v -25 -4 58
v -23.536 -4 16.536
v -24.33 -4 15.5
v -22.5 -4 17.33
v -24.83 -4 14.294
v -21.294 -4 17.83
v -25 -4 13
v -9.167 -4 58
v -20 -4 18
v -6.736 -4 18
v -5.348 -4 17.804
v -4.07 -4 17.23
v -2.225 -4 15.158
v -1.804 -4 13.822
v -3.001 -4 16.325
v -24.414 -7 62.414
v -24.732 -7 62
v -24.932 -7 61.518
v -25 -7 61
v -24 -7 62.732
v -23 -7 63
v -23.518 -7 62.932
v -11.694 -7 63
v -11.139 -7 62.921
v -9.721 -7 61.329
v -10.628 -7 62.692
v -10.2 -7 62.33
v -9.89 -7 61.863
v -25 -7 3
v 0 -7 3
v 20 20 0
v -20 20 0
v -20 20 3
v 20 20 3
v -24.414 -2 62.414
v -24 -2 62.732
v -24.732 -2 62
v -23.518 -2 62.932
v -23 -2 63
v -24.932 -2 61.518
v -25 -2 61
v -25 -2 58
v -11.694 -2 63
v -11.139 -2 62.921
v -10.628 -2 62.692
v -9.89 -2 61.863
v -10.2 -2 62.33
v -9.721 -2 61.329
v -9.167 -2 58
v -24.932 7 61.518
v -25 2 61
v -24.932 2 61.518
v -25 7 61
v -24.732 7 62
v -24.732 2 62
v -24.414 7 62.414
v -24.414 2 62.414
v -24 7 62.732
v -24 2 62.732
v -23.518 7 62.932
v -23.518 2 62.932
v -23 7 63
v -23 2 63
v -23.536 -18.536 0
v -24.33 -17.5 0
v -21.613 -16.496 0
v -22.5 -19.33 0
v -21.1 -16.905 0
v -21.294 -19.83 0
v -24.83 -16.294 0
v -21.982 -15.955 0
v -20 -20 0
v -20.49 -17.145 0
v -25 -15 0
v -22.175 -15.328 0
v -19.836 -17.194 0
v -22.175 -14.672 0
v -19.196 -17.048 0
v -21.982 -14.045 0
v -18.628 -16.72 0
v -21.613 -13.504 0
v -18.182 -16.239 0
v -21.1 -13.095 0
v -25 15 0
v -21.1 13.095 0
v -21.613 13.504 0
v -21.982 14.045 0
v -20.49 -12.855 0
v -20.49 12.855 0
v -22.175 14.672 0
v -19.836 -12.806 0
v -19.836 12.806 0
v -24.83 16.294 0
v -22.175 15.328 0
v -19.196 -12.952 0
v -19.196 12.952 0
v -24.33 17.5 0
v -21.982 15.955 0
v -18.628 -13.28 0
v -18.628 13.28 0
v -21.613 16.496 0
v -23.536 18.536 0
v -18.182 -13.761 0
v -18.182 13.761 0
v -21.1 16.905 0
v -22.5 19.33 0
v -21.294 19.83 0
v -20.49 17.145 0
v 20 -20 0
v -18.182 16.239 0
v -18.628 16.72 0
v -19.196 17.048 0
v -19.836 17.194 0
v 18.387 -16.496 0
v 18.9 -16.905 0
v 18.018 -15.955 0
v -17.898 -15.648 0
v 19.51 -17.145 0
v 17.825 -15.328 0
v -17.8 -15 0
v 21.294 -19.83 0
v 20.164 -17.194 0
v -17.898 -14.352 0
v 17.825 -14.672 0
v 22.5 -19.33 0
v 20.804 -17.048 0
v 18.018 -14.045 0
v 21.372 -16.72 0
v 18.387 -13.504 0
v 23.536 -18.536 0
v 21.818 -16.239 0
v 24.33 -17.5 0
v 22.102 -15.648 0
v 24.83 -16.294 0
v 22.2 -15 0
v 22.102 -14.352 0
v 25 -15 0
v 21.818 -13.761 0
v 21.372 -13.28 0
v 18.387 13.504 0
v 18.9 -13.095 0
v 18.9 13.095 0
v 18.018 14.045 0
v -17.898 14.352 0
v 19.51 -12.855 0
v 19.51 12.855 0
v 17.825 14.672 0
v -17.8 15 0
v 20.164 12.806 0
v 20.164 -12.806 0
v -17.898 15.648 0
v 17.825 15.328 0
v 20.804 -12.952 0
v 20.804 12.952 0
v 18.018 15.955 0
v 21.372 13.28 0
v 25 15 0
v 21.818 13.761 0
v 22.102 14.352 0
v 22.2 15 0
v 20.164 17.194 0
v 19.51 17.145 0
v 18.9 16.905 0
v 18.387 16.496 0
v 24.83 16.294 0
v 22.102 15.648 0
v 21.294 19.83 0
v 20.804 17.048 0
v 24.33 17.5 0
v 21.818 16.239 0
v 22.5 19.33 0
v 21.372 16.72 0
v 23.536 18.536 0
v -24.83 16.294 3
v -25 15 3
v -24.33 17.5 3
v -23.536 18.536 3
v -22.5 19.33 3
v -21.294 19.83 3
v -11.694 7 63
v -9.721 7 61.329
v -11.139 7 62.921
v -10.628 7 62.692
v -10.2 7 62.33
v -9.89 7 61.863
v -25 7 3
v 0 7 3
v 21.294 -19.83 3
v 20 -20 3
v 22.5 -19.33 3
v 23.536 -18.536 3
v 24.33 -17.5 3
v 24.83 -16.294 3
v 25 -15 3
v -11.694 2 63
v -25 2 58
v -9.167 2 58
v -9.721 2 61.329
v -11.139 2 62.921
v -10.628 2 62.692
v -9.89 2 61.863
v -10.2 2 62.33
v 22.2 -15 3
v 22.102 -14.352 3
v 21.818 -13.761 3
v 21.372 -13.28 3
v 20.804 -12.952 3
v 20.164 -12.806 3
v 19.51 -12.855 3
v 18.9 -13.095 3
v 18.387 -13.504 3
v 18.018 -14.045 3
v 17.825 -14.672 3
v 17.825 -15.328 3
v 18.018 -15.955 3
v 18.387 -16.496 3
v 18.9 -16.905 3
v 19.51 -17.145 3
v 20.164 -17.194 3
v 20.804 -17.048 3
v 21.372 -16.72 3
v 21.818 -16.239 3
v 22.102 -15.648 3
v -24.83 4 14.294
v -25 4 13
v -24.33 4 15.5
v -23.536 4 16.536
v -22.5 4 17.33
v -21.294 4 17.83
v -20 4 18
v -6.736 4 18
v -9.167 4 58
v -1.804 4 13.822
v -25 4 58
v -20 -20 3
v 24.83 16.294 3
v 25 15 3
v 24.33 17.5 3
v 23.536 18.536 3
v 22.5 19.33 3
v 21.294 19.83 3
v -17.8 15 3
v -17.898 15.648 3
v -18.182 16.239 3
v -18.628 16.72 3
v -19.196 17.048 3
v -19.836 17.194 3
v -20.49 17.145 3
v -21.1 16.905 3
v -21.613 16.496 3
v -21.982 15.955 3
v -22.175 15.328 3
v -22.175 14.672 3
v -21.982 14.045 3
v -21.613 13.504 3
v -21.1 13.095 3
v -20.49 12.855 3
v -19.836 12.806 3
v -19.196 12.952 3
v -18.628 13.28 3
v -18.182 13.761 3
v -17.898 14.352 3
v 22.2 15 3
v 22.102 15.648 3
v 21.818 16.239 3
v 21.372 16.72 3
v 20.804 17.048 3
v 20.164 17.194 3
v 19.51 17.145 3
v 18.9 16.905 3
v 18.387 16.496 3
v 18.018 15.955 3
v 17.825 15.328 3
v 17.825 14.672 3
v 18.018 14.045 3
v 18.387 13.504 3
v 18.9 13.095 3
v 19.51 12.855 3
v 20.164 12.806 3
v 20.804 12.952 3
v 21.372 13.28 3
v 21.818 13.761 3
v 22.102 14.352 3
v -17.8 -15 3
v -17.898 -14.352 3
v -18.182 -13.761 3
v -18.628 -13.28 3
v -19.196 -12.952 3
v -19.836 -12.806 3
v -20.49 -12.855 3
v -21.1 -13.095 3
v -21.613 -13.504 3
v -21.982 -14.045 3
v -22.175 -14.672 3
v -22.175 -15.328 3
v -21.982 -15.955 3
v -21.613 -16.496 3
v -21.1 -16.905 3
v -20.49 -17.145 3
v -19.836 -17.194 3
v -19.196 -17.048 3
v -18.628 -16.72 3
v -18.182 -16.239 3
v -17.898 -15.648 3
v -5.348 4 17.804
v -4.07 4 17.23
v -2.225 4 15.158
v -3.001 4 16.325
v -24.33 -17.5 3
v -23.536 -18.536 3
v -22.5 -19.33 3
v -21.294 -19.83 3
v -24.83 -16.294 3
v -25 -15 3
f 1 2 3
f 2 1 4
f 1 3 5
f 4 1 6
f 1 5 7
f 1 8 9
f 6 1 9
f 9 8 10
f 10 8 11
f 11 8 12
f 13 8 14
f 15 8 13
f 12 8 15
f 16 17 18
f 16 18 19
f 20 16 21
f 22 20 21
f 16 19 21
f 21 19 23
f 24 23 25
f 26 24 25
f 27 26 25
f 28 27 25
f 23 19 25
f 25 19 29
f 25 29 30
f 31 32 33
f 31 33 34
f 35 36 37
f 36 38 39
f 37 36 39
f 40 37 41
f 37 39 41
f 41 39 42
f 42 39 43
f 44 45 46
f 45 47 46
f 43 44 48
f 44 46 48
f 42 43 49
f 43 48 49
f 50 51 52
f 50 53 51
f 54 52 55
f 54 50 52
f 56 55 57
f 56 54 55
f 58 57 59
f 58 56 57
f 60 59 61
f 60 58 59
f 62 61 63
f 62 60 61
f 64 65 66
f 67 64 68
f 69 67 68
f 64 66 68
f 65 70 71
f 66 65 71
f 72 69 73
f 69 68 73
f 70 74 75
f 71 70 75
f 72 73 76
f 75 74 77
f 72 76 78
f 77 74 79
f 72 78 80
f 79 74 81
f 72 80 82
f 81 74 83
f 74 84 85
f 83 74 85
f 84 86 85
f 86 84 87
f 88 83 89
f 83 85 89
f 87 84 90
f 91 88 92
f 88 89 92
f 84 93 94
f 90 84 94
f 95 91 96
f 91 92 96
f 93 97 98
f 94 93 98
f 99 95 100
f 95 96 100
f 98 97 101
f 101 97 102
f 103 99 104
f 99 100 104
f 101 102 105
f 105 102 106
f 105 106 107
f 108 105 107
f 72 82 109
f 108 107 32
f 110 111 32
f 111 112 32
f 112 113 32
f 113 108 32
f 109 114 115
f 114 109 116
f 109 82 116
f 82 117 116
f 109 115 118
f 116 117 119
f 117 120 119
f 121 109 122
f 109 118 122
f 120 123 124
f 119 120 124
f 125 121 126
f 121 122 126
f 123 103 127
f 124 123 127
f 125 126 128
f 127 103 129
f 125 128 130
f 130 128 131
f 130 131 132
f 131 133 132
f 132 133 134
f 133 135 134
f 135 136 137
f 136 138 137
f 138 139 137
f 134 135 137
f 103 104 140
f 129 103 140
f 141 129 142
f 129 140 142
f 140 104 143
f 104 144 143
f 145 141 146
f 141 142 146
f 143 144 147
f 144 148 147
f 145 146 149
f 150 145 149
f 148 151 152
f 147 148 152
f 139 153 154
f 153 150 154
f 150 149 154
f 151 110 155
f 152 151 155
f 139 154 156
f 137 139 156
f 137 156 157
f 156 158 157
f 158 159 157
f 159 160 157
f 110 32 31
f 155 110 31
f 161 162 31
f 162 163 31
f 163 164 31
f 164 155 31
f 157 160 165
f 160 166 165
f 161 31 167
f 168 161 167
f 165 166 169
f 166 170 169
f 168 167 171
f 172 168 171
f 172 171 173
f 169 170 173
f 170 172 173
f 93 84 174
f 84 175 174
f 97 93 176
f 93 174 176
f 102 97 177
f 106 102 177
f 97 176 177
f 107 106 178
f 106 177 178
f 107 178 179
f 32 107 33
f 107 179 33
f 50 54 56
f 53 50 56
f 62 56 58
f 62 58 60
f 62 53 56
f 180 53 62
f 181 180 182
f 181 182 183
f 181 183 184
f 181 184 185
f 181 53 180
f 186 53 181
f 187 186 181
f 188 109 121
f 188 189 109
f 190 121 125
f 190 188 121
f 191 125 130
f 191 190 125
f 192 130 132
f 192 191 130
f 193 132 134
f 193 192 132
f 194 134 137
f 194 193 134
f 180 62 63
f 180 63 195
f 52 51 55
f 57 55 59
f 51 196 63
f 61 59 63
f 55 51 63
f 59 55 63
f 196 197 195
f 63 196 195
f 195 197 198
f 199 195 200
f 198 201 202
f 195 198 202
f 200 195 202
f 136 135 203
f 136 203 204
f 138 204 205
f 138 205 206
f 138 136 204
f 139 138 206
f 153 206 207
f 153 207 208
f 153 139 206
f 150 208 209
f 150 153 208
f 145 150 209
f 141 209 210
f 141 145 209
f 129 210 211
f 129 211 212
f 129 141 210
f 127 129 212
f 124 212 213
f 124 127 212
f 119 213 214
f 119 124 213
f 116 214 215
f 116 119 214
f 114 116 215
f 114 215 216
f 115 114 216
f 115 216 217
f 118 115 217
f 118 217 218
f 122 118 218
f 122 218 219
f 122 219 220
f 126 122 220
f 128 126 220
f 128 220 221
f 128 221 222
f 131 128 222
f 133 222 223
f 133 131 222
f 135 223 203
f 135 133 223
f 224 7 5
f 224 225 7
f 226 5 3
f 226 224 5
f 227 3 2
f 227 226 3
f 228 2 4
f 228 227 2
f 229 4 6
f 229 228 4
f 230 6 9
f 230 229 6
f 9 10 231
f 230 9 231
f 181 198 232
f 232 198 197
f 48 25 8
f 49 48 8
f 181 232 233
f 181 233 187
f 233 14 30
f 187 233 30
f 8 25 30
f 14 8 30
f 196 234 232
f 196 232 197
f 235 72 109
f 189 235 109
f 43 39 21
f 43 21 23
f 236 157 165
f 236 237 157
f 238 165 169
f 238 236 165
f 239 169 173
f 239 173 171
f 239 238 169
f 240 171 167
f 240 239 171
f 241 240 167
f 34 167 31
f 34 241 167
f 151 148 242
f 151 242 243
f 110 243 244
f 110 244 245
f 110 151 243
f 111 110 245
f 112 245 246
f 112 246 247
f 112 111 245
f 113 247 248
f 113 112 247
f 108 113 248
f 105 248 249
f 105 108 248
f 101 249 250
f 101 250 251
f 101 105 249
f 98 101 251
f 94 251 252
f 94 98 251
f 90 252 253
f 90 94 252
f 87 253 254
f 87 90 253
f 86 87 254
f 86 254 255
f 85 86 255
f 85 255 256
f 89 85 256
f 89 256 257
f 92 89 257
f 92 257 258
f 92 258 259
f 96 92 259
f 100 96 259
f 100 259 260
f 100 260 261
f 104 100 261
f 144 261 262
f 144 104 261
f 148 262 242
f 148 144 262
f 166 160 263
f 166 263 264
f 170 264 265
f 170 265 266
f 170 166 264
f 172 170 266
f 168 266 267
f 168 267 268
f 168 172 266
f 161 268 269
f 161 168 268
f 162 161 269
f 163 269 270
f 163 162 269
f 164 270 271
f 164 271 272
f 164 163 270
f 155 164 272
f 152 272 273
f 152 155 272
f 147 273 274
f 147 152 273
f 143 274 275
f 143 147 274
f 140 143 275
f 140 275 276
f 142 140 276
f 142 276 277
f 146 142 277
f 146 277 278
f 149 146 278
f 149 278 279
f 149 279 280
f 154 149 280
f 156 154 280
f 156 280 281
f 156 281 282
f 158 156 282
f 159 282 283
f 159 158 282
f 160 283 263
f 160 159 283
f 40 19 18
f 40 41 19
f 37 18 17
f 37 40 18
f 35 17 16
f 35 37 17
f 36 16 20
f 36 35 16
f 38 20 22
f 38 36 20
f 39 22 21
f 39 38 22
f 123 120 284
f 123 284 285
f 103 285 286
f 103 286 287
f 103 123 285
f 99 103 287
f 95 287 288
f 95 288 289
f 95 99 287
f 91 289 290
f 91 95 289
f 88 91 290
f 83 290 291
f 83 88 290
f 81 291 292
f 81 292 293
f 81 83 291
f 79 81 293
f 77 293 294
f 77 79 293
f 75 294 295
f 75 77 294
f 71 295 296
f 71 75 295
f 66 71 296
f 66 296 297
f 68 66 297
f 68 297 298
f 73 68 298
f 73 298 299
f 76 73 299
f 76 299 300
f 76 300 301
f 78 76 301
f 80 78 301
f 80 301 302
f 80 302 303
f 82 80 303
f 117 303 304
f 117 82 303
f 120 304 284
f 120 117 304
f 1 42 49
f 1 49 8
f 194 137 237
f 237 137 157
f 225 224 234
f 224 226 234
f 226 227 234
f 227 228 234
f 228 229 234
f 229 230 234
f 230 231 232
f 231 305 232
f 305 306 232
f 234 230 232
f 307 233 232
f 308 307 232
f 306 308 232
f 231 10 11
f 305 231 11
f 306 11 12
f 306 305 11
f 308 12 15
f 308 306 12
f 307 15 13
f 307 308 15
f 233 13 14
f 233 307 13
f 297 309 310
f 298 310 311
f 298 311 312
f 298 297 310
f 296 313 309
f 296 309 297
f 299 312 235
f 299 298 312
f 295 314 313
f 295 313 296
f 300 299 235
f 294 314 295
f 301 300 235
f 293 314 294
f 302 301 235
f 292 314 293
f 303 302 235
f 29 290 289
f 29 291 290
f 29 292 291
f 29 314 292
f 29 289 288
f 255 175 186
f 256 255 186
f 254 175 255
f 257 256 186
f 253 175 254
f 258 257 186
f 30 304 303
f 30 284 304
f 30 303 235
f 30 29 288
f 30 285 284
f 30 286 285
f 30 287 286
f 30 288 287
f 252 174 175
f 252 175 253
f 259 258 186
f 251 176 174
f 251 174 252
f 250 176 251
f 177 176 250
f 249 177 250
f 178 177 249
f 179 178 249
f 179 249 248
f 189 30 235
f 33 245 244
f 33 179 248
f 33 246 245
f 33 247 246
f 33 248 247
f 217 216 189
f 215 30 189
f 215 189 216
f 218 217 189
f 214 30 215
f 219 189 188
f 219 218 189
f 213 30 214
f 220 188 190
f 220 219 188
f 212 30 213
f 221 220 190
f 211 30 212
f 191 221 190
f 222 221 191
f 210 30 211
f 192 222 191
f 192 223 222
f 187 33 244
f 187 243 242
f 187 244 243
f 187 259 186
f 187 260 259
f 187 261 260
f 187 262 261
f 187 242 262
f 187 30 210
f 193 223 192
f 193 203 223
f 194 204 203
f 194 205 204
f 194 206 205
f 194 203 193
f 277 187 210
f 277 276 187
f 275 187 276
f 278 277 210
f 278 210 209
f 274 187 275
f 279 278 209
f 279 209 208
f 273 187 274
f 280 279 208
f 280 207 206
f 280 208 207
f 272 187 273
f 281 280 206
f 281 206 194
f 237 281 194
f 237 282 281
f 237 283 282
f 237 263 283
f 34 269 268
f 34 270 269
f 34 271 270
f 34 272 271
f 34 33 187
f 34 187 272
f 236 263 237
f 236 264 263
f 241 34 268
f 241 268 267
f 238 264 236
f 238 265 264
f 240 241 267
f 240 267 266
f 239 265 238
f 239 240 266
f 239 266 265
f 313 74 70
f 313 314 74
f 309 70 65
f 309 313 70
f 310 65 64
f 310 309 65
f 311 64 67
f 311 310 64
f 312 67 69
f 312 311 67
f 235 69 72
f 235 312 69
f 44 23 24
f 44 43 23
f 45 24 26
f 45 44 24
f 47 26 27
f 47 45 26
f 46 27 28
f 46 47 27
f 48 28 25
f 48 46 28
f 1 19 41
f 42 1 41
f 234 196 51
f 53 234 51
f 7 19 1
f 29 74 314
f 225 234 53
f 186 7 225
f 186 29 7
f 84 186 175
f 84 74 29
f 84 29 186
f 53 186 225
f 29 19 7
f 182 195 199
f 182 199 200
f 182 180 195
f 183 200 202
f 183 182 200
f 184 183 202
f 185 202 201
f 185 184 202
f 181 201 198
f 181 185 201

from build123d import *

# Parameters (mm, degrees)
SKETCH_W        = 50
SKETCH_H        = 40
SKETCH_R        = 2.2
PAD_DEPTH       = 3
SKETCH001_W     = 50
SKETCH001_H     = 14
PAD001_DEPTH    = 60
POCKET_DEPTH    = 50
POCKET001_DEPTH = 14
FILLET_R        = 5
FILLET001_R     = 2
FILLET002_R     = 5


with BuildPart() as part:
    # Sketch → Pad (new body)
    with BuildSketch(Plane.XY):
        Rectangle(SKETCH_W, SKETCH_H)
        with Locations((-20, -15)):
            Circle(SKETCH_R, mode=Mode.SUBTRACT)
        with Locations((20, 15)):
            Circle(SKETCH_R, mode=Mode.SUBTRACT)
        with Locations((20, -15)):
            Circle(SKETCH_R, mode=Mode.SUBTRACT)
        with Locations((-20, 15)):
            Circle(SKETCH_R, mode=Mode.SUBTRACT)
    extrude(amount=PAD_DEPTH)

    # Sketch001 (on Face10 of Pad) → Pad001 (join)
    with BuildSketch(Plane.XY.offset(3)):
        Rectangle(SKETCH001_W, SKETCH001_H)
    extrude(amount=PAD001_DEPTH)

    # Sketch002 (on Face9 of Pad001) → Pocket (cut)
    with BuildSketch(Plane.YZ.offset(25)):
        Polygon((-2, 63), (-2, 58), (-4, 58), (-4, 18), (4, 18), (4, 58), (2, 58), (2, 63), align=None)
    extrude(amount=-POCKET_DEPTH, mode=Mode.SUBTRACT)

    # Sketch003 (on Face15 of Pocket) → Pocket001 (cut)
    with BuildSketch(Plane.XZ.offset(7)):
        Polygon((-10, 63), (0, 3), (25, 3), (25, 63), align=None)
    extrude(amount=-POCKET001_DEPTH, mode=Mode.SUBTRACT)

    # Fillet
    fillet_edges = [part.edges().sort_by_distance(p)[0] for p in [
        (-25, -20, 1.5),
        (25, -20, 1.5),
        (25, 20, 1.5),
        (-25, 20, 1.5),
    ]]
    fillet(fillet_edges, radius=FILLET_R)

    # Fillet001
    fillet001_edges = [part.edges().sort_by_distance(p)[0] for p in [
        (-10, -4.5, 63),
        (-25, -4.5, 63),
        (-10, 4.5, 63),
        (-25, 4.5, 63),
    ]]
    fillet(fillet001_edges, radius=FILLET001_R)

    # Fillet002
    fillet002_edges = [part.edges().sort_by_distance(p)[0] for p in [
        (-2.5, 0, 18),
        (-25, 0, 18),
    ]]
    fillet(fillet002_edges, radius=FILLET002_R)


solid = part.part
